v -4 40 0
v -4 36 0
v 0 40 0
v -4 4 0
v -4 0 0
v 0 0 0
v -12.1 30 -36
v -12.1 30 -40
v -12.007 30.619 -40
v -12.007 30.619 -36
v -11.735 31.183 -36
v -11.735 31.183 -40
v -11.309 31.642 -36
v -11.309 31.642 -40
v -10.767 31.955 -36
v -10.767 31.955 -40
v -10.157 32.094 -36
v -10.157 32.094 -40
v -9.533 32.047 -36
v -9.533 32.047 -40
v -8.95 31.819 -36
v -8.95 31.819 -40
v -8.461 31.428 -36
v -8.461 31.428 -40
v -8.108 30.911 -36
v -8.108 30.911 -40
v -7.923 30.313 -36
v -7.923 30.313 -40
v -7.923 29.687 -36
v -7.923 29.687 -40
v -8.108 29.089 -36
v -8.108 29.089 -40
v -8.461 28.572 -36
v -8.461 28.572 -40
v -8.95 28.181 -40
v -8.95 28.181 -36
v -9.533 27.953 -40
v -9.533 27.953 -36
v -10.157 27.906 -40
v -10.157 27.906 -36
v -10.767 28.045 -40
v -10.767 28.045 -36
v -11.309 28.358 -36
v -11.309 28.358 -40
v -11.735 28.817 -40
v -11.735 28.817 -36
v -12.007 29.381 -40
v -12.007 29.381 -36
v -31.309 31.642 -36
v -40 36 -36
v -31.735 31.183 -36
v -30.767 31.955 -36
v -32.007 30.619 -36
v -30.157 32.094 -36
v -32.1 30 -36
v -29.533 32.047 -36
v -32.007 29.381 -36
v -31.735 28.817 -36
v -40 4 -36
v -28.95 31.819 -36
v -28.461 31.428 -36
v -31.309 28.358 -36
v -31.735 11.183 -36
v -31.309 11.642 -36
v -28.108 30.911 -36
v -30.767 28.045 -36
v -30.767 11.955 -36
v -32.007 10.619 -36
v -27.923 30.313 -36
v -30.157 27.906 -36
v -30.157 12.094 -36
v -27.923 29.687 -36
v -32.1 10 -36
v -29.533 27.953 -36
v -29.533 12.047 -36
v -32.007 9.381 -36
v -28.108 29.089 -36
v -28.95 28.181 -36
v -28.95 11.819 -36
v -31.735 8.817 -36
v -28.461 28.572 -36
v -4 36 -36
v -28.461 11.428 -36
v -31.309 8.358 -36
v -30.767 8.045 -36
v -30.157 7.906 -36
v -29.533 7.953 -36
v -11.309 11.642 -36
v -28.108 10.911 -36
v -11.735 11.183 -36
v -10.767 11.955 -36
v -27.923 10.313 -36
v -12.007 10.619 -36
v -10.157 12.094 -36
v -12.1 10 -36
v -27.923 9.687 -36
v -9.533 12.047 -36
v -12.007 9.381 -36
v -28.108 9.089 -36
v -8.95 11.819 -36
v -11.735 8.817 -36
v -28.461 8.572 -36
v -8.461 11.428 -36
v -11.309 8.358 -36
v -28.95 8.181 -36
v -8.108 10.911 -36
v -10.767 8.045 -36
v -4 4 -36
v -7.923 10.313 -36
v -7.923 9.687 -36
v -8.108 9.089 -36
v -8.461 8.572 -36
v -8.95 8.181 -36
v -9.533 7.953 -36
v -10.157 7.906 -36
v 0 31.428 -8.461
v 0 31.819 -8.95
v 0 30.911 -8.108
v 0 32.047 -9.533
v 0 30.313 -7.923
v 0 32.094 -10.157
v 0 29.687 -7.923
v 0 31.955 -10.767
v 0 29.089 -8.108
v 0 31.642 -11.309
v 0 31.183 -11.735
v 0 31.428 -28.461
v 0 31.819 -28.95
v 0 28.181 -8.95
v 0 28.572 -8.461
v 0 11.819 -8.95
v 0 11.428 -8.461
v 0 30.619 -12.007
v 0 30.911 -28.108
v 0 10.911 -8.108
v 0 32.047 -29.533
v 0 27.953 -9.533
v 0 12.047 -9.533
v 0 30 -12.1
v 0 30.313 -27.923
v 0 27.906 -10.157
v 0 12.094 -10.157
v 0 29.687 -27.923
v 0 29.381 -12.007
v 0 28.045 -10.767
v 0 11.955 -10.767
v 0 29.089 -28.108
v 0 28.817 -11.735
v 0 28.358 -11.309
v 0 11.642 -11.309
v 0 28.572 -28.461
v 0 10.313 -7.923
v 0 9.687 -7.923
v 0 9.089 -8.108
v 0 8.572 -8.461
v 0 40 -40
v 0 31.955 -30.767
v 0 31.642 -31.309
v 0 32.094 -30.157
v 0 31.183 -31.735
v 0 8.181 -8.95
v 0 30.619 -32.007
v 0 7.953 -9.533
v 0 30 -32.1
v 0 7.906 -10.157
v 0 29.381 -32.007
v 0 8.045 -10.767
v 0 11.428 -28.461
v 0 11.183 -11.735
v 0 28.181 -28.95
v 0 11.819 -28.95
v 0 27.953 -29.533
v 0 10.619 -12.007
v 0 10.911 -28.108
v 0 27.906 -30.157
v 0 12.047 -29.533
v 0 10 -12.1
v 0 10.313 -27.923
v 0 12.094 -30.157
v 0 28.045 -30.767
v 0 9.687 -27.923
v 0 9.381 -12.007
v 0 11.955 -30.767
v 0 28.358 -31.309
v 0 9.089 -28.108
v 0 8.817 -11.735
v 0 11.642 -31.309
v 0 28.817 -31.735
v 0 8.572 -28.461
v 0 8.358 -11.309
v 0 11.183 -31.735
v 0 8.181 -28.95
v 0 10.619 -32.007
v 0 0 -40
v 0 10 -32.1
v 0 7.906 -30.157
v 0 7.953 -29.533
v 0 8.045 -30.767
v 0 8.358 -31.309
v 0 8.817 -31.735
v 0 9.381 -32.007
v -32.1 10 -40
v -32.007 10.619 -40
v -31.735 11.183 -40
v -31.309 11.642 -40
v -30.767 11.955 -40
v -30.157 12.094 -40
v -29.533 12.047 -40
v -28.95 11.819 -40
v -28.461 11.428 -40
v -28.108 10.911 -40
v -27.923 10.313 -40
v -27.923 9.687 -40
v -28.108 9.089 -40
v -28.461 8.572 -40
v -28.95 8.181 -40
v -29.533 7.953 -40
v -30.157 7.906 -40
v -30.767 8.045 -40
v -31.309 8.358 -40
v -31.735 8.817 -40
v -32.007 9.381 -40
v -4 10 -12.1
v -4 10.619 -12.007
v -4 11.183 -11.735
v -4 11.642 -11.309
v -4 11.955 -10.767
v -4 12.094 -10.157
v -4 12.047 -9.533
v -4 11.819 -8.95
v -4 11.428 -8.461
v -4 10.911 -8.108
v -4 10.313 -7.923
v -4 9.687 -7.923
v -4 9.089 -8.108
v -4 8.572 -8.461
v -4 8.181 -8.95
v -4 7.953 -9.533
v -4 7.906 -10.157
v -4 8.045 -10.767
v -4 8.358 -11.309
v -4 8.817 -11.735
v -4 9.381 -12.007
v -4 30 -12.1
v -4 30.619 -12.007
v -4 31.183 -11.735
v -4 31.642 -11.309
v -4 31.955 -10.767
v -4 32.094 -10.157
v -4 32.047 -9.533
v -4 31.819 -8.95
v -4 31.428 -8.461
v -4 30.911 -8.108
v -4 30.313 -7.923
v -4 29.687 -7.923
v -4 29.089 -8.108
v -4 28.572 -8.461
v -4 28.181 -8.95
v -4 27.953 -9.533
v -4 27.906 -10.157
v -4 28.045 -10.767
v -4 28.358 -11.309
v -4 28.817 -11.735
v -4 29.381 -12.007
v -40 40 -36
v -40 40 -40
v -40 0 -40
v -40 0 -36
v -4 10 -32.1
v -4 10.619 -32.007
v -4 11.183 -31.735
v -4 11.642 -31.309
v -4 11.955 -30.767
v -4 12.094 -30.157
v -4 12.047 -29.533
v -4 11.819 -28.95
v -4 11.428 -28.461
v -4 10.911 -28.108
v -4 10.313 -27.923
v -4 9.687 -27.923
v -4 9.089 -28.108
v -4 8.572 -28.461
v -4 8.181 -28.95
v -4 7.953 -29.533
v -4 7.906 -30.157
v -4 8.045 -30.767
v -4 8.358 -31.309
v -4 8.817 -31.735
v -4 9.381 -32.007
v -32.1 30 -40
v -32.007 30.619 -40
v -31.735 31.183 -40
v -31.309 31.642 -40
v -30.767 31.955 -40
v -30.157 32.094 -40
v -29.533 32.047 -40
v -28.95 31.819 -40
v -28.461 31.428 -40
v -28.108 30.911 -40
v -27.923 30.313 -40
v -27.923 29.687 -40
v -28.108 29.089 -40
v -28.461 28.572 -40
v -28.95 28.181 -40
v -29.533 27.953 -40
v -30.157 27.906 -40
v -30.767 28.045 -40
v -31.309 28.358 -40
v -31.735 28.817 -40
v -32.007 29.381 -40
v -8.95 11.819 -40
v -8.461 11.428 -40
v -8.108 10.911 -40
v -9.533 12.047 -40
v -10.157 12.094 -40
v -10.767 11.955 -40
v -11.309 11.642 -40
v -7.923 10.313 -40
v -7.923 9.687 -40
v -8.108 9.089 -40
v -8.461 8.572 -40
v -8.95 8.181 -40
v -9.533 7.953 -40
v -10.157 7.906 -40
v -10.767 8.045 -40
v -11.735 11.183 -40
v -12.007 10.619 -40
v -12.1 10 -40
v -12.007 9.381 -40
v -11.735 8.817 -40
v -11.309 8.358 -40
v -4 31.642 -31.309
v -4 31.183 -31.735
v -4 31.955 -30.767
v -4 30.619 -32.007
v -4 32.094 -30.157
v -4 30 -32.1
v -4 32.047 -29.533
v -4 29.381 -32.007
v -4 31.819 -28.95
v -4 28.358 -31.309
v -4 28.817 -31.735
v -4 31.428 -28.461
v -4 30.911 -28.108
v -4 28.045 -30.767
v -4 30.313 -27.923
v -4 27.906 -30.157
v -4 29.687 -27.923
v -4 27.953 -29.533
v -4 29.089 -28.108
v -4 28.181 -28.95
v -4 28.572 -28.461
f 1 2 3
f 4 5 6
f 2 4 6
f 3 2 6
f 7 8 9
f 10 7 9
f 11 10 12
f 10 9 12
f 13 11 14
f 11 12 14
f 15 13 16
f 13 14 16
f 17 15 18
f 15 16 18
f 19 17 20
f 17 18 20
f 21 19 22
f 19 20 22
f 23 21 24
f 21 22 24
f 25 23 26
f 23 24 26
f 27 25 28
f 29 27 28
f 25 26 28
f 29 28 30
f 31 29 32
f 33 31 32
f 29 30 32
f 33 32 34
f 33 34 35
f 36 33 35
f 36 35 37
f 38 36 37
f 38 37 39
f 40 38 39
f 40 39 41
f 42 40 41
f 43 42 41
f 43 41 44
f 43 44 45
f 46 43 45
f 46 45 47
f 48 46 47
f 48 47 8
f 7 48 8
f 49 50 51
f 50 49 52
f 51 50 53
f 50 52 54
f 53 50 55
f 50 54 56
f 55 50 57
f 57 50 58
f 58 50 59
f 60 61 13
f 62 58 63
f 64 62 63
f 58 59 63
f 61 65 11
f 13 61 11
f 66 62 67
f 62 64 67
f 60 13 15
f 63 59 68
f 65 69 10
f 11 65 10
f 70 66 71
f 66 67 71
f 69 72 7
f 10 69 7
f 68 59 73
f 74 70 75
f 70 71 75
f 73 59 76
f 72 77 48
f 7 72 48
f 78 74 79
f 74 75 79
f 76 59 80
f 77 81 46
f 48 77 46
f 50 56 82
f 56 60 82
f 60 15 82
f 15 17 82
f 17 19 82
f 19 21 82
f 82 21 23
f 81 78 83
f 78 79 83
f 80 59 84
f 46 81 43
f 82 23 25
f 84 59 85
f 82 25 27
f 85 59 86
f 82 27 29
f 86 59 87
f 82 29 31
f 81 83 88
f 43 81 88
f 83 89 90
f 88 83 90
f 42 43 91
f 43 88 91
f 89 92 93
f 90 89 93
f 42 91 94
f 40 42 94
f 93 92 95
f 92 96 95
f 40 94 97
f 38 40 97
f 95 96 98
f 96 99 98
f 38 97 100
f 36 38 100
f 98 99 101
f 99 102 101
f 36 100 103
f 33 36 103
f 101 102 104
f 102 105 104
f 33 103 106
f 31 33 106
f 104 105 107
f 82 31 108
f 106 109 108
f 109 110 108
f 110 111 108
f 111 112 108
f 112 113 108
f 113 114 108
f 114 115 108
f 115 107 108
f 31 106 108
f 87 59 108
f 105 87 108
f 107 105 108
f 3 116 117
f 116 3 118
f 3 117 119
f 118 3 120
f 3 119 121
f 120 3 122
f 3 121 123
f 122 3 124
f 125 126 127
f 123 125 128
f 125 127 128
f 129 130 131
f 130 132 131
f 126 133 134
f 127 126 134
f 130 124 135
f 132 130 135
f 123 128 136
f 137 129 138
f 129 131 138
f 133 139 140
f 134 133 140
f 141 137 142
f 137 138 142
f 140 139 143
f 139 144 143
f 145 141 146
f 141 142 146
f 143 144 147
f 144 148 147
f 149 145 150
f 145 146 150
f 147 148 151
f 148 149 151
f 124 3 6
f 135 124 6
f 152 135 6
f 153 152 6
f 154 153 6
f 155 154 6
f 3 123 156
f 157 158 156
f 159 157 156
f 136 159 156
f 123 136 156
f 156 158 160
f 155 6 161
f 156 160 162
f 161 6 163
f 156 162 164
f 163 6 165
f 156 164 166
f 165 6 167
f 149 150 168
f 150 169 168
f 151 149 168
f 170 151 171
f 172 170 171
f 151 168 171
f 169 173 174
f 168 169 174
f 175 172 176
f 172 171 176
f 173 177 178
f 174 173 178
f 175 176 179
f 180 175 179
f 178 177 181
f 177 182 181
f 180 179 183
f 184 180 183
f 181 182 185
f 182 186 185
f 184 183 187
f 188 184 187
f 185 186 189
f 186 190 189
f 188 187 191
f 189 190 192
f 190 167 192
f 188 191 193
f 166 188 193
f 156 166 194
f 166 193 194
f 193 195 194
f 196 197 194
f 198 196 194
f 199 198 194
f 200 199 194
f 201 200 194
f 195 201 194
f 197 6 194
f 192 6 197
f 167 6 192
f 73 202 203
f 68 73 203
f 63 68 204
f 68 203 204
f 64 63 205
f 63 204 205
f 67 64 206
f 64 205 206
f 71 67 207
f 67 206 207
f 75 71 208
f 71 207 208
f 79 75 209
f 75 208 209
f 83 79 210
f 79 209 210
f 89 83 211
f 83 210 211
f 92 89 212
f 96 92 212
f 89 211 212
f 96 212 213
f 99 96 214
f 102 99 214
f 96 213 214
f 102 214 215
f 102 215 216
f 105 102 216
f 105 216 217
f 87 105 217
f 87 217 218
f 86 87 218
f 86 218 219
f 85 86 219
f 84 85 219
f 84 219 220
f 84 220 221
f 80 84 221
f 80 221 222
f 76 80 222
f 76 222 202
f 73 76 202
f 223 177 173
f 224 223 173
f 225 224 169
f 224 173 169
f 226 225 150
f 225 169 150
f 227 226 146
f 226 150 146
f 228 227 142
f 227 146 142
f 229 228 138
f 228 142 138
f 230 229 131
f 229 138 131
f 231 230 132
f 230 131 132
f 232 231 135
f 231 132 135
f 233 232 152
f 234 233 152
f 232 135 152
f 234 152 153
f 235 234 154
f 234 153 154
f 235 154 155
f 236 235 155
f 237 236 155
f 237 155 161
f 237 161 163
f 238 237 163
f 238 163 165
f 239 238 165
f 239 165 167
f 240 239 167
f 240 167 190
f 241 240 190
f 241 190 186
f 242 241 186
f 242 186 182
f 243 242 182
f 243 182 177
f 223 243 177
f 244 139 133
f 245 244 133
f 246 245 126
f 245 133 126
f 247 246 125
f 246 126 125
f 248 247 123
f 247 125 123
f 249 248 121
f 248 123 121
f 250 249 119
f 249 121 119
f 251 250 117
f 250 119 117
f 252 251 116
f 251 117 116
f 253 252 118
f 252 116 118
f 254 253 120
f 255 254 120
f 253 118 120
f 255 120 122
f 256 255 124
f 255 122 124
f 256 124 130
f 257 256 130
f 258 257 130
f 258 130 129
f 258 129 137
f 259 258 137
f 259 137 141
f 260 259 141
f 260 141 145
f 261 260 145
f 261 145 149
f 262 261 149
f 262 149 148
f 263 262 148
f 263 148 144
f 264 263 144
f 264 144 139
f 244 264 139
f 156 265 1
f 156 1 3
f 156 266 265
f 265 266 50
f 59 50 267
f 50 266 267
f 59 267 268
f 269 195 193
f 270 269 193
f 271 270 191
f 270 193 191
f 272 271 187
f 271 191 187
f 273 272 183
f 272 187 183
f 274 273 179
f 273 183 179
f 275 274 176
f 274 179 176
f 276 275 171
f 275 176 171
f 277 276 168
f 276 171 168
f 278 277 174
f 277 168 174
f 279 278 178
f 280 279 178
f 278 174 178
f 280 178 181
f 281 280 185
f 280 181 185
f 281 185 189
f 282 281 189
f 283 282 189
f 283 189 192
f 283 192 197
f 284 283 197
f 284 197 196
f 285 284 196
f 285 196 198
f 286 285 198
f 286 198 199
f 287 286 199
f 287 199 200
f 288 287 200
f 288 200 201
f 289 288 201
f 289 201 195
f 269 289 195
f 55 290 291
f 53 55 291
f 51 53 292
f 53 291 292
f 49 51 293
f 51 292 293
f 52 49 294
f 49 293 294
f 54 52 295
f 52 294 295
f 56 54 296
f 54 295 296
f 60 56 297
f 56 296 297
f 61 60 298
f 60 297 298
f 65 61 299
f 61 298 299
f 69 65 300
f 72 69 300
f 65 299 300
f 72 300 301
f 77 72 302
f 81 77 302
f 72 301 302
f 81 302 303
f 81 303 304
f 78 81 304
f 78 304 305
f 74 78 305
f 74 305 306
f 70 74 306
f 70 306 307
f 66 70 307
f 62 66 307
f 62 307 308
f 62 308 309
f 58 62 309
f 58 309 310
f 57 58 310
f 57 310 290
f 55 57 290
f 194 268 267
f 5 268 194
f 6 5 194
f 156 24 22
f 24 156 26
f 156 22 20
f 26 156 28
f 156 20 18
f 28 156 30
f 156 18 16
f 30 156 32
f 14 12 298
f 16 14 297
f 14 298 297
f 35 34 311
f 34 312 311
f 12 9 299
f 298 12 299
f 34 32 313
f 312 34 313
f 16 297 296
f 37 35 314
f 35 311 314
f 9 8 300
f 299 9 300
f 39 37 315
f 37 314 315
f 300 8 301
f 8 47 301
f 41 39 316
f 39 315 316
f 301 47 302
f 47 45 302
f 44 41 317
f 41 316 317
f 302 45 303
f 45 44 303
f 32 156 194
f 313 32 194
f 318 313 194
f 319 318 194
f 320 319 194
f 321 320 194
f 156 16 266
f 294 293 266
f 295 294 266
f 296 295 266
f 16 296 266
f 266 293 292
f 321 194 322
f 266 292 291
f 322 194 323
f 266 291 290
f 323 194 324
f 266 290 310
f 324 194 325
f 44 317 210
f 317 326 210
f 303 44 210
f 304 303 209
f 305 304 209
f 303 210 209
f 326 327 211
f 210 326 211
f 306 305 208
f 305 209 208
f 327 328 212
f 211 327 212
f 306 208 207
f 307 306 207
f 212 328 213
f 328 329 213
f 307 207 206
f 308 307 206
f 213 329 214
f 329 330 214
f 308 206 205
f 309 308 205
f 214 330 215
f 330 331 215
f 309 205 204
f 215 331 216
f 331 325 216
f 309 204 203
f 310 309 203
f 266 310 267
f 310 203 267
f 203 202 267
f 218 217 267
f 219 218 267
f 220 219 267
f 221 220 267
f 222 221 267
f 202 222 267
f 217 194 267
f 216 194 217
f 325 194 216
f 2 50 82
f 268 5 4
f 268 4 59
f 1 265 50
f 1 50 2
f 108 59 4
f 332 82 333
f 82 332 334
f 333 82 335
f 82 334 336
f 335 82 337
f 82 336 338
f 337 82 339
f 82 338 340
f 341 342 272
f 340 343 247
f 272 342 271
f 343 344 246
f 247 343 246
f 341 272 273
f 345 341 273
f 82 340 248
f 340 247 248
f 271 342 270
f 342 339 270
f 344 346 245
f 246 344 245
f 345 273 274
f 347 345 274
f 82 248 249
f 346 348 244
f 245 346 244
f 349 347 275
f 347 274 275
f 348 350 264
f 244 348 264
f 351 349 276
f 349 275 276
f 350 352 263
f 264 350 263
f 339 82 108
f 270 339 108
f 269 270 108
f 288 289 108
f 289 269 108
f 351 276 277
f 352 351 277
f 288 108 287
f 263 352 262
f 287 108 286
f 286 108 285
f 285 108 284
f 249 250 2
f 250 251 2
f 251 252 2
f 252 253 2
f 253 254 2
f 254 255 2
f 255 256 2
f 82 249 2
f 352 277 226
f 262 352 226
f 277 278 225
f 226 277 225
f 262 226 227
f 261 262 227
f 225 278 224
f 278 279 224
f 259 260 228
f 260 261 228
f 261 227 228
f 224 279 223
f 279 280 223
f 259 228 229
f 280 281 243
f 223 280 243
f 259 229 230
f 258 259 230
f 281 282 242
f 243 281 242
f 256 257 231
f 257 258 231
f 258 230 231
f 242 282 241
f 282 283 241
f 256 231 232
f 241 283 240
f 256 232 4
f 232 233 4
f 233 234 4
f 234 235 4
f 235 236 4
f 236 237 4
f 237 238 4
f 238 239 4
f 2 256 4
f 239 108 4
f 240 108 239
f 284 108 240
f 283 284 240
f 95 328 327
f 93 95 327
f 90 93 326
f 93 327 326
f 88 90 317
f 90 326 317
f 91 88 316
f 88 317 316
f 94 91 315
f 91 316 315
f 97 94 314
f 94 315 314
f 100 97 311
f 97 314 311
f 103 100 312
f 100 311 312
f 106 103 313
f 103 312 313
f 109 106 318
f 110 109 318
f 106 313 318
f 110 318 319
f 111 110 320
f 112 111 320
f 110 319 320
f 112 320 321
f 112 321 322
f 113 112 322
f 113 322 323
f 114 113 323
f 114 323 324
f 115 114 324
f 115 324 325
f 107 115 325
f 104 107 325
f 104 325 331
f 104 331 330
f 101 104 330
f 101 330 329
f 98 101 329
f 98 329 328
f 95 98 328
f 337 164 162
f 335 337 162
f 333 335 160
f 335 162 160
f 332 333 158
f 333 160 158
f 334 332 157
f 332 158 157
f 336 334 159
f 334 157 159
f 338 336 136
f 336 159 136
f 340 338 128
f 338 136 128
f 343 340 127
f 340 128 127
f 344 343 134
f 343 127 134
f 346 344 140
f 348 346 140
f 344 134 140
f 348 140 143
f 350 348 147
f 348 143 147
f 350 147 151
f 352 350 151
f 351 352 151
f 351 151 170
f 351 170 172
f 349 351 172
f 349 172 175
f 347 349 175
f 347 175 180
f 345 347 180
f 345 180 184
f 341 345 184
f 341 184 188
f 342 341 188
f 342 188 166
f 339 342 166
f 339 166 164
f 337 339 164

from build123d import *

# Parameters (mm, degrees)
BOSS_EXTRUDE1_DEPTH = 40
SKETCH2_R           = 2.1
CUT_EXTRUDE1_DEPTH  = 40
SKETCH3_R           = 2.1
CUT_EXTRUDE2_DEPTH  = 40
BOSS_EXTRUDE2_DEPTH = 4
BOSS_EXTRUDE3_DEPTH = 4


with BuildPart() as part:
    # Sketch1 → Boss-Extrude1 (new body)
    with BuildSketch(Plane(origin=(0, 0, 0), x_dir=(1, 0, 0), z_dir=(0, 1, 0))):
        Polygon((0, 0), (0, 40), (-40, 40), (-40, 36), (-4, 36), (-4, 0), align=None)
    extrude(amount=BOSS_EXTRUDE1_DEPTH)

    # Sketch2 → Cut-Extrude1 (cut)
    with BuildSketch(Plane(origin=(0, 0, -40), x_dir=(-1, 0, 0), z_dir=(0, 0, -1))):
        with Locations((30, 30)):
            Circle(SKETCH2_R)
        with Locations((30, 10)):
            Circle(SKETCH2_R)
        with Locations((10, 10)):
            Circle(SKETCH2_R)
        with Locations((10, 30)):
            Circle(SKETCH2_R)
    extrude(amount=-CUT_EXTRUDE1_DEPTH, mode=Mode.SUBTRACT)

    # Sketch3 → Cut-Extrude2 (cut)
    with BuildSketch(Plane(origin=(0, 0, 0), x_dir=(0, 0, -1), z_dir=(1, 0, 0))):
        with Locations((10, 30)):
            Circle(SKETCH3_R)
        with Locations((30, 30)):
            Circle(SKETCH3_R)
        with Locations((30, 10)):
            Circle(SKETCH3_R)
        with Locations((10, 10)):
            Circle(SKETCH3_R)
    extrude(amount=-CUT_EXTRUDE2_DEPTH, mode=Mode.SUBTRACT)

    # Sketch4 → Boss-Extrude2 (add)
    with BuildSketch(Plane(origin=(0, 40, 0), x_dir=(1, 0, 0), z_dir=(0, 1, 0))):
        Polygon((-40, 36), (-4, 0), (-4, 36), align=None)
    extrude(amount=-BOSS_EXTRUDE2_DEPTH)

    # Sketch5 → Boss-Extrude3 (add)
    with BuildSketch(Plane.XZ):
        Polygon((-4, -36), (-4, 0), (-40, -36), align=None)
    extrude(amount=-BOSS_EXTRUDE3_DEPTH)


solid = part.part
